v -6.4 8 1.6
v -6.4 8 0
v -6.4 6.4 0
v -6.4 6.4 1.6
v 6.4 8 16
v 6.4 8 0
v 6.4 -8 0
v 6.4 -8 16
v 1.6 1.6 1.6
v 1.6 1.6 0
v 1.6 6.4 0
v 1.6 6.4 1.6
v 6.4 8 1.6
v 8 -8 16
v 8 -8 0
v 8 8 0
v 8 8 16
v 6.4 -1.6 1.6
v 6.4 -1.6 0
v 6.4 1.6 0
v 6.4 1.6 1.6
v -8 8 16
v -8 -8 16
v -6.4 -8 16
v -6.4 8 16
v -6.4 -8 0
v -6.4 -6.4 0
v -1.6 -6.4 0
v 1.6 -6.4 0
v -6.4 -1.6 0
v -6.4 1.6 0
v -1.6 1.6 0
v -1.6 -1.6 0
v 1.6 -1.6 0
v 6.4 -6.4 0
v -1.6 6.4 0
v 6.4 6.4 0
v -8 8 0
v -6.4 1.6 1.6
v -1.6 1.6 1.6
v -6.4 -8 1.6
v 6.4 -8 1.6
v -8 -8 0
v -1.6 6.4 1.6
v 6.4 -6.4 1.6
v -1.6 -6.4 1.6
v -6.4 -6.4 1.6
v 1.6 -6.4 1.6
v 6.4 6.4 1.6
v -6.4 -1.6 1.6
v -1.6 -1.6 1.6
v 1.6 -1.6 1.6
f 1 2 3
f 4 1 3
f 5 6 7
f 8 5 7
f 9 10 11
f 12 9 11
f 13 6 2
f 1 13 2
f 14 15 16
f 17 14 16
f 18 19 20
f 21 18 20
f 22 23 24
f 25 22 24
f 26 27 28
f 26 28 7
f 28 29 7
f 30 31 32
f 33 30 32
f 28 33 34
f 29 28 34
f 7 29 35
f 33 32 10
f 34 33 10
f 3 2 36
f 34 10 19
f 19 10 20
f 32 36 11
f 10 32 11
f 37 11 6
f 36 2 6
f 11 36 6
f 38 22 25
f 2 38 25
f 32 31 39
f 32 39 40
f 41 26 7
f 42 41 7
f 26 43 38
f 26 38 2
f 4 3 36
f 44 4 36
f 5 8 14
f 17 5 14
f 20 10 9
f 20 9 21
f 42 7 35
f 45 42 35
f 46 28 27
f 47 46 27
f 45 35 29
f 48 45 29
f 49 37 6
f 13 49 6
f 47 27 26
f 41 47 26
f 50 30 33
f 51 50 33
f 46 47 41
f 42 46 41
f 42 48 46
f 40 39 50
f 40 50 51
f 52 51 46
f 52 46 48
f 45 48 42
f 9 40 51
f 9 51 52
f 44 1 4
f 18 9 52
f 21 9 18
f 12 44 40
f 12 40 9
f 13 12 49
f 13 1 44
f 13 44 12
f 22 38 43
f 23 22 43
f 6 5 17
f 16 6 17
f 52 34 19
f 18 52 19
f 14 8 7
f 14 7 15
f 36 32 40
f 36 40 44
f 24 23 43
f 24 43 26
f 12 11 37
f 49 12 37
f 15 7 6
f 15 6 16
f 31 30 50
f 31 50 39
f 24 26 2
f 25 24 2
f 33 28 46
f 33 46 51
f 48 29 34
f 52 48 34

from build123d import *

# Parameters (mm, degrees)
F1_W     = 1.6
F1_H     = 1.6
F2_DEPTH = 16
F1_W_2   = 3.2
F1_H_2   = 4.8
F1_W_3   = 4.8
F1_H_3   = 3.2
F3_DEPTH = 1.6


with BuildPart() as f2:
    # F1 (on Top) → F2 (new body)
    with BuildSketch(Plane.XY):
        Polygon((-6.4, 1.6), (-6.4, 6.4), (-8, 6.4), (-8, -6.4), (-6.4, -6.4), (-6.4, -1.6), align=None)
        with Locations((-7.2, -7.2)):
            Rectangle(F1_W, F1_H)
        with Locations((-7.2, 7.2)):
            Rectangle(F1_W, F1_H)
    extrude(amount=F2_DEPTH)


with BuildPart() as f2b:
    # F1 (on Top) → F2, piece 2 (new body)
    with BuildSketch(Plane.XY):
        with Locations((7.2, 7.2)):
            Rectangle(F1_W, F1_H)
        Polygon((8, -6.4), (8, 6.4), (6.4, 6.4), (6.4, 1.6), (6.4, -1.6), (6.4, -6.4), align=None)
        with Locations((7.2, -7.2)):
            Rectangle(F1_W, F1_H)
    extrude(amount=F2_DEPTH)


with BuildPart() as f3:
    # F1 (on Top) → F3 (new body)
    with BuildSketch(Plane.XY):
        Polygon((6.4, 6.4), (6.4, 8), (-6.4, 8), (-6.4, 6.4), (-1.6, 6.4), (1.6, 6.4), align=None)
        Polygon((6.4, -8), (6.4, -6.4), (1.6, -6.4), (-1.6, -6.4), (-6.4, -6.4), (-6.4, -8), align=None)
        with Locations((0, 4)):
            Rectangle(F1_W_2, F1_H_2)
        with Locations((-4, 0)):
            Rectangle(F1_W_3, F1_H_3)
        Rectangle(F1_W_2, F1_H_3)
        with Locations((4, 0)):
            Rectangle(F1_W_3, F1_H_3)
        with Locations((0, -4)):
            Rectangle(F1_W_2, F1_H_2)
    extrude(amount=F3_DEPTH)


solid = Compound([f2.part, f2b.part, f3.part])
